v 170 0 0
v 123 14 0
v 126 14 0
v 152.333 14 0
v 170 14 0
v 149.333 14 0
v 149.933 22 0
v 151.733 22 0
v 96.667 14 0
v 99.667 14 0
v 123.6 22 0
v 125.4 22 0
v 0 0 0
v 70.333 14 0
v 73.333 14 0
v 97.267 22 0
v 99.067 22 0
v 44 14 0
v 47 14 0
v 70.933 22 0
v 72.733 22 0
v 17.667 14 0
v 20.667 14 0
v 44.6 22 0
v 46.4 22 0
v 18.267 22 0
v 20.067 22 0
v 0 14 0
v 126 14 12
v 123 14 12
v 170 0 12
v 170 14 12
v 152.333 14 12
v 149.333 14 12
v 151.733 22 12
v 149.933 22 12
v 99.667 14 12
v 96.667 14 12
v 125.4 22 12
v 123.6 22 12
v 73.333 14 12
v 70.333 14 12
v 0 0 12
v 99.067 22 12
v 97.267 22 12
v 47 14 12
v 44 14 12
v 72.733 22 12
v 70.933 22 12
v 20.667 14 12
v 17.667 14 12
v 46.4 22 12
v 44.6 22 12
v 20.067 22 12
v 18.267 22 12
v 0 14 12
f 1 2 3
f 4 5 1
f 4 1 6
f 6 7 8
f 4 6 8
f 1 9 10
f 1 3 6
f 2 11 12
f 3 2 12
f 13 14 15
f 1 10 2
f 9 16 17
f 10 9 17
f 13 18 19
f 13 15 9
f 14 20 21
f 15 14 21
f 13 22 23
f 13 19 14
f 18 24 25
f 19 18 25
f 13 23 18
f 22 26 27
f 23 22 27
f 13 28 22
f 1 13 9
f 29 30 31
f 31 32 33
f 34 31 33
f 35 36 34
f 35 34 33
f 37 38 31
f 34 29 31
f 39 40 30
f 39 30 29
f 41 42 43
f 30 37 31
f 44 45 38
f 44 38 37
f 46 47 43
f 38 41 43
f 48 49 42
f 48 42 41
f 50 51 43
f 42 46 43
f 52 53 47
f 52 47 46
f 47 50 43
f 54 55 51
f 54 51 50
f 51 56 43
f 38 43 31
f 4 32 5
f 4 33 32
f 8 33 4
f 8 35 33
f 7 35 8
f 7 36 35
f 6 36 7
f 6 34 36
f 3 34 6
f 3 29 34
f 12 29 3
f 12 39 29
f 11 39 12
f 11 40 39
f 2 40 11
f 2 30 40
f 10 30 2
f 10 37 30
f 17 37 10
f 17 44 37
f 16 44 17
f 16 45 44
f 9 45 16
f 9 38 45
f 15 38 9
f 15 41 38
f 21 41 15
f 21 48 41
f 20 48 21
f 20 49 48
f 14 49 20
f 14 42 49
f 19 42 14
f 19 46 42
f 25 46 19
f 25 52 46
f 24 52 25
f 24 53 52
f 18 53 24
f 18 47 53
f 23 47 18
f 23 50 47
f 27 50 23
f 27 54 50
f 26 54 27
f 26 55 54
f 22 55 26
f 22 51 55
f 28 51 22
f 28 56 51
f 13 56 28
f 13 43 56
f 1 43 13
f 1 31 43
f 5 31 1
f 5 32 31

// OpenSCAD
$fn = 32;

// ----------------------------------------------------------------------
// Gear rack: 6 teeth on a 170 mm bar, pitch 26.33 mm
// ----------------------------------------------------------------------

// --- parameters (mm) ---
profile_height = 12;      // extrusion height
profile_points = 28;      // points of the closed outline

profile = [[0, 0], [170, 0], [170, 14], [152.333, 14], [151.733, 22], [149.933, 22], [149.333, 14], [126, 14], [125.4, 22], [123.6, 22], [123, 14], [99.667, 14], [99.067, 22], [97.267, 22], [96.667, 14], [73.333, 14], [72.733, 22], [70.933, 22], [70.333, 14], [47, 14], [46.4, 22], [44.6, 22], [44, 14], [20.667, 14], [20.067, 22], [18.267, 22], [17.667, 14], [0, 14]];  // single closed polygon, 28 points, counter clockwise

// --- the one profile operation ---
linear_extrude(height = profile_height) polygon(points = profile);
